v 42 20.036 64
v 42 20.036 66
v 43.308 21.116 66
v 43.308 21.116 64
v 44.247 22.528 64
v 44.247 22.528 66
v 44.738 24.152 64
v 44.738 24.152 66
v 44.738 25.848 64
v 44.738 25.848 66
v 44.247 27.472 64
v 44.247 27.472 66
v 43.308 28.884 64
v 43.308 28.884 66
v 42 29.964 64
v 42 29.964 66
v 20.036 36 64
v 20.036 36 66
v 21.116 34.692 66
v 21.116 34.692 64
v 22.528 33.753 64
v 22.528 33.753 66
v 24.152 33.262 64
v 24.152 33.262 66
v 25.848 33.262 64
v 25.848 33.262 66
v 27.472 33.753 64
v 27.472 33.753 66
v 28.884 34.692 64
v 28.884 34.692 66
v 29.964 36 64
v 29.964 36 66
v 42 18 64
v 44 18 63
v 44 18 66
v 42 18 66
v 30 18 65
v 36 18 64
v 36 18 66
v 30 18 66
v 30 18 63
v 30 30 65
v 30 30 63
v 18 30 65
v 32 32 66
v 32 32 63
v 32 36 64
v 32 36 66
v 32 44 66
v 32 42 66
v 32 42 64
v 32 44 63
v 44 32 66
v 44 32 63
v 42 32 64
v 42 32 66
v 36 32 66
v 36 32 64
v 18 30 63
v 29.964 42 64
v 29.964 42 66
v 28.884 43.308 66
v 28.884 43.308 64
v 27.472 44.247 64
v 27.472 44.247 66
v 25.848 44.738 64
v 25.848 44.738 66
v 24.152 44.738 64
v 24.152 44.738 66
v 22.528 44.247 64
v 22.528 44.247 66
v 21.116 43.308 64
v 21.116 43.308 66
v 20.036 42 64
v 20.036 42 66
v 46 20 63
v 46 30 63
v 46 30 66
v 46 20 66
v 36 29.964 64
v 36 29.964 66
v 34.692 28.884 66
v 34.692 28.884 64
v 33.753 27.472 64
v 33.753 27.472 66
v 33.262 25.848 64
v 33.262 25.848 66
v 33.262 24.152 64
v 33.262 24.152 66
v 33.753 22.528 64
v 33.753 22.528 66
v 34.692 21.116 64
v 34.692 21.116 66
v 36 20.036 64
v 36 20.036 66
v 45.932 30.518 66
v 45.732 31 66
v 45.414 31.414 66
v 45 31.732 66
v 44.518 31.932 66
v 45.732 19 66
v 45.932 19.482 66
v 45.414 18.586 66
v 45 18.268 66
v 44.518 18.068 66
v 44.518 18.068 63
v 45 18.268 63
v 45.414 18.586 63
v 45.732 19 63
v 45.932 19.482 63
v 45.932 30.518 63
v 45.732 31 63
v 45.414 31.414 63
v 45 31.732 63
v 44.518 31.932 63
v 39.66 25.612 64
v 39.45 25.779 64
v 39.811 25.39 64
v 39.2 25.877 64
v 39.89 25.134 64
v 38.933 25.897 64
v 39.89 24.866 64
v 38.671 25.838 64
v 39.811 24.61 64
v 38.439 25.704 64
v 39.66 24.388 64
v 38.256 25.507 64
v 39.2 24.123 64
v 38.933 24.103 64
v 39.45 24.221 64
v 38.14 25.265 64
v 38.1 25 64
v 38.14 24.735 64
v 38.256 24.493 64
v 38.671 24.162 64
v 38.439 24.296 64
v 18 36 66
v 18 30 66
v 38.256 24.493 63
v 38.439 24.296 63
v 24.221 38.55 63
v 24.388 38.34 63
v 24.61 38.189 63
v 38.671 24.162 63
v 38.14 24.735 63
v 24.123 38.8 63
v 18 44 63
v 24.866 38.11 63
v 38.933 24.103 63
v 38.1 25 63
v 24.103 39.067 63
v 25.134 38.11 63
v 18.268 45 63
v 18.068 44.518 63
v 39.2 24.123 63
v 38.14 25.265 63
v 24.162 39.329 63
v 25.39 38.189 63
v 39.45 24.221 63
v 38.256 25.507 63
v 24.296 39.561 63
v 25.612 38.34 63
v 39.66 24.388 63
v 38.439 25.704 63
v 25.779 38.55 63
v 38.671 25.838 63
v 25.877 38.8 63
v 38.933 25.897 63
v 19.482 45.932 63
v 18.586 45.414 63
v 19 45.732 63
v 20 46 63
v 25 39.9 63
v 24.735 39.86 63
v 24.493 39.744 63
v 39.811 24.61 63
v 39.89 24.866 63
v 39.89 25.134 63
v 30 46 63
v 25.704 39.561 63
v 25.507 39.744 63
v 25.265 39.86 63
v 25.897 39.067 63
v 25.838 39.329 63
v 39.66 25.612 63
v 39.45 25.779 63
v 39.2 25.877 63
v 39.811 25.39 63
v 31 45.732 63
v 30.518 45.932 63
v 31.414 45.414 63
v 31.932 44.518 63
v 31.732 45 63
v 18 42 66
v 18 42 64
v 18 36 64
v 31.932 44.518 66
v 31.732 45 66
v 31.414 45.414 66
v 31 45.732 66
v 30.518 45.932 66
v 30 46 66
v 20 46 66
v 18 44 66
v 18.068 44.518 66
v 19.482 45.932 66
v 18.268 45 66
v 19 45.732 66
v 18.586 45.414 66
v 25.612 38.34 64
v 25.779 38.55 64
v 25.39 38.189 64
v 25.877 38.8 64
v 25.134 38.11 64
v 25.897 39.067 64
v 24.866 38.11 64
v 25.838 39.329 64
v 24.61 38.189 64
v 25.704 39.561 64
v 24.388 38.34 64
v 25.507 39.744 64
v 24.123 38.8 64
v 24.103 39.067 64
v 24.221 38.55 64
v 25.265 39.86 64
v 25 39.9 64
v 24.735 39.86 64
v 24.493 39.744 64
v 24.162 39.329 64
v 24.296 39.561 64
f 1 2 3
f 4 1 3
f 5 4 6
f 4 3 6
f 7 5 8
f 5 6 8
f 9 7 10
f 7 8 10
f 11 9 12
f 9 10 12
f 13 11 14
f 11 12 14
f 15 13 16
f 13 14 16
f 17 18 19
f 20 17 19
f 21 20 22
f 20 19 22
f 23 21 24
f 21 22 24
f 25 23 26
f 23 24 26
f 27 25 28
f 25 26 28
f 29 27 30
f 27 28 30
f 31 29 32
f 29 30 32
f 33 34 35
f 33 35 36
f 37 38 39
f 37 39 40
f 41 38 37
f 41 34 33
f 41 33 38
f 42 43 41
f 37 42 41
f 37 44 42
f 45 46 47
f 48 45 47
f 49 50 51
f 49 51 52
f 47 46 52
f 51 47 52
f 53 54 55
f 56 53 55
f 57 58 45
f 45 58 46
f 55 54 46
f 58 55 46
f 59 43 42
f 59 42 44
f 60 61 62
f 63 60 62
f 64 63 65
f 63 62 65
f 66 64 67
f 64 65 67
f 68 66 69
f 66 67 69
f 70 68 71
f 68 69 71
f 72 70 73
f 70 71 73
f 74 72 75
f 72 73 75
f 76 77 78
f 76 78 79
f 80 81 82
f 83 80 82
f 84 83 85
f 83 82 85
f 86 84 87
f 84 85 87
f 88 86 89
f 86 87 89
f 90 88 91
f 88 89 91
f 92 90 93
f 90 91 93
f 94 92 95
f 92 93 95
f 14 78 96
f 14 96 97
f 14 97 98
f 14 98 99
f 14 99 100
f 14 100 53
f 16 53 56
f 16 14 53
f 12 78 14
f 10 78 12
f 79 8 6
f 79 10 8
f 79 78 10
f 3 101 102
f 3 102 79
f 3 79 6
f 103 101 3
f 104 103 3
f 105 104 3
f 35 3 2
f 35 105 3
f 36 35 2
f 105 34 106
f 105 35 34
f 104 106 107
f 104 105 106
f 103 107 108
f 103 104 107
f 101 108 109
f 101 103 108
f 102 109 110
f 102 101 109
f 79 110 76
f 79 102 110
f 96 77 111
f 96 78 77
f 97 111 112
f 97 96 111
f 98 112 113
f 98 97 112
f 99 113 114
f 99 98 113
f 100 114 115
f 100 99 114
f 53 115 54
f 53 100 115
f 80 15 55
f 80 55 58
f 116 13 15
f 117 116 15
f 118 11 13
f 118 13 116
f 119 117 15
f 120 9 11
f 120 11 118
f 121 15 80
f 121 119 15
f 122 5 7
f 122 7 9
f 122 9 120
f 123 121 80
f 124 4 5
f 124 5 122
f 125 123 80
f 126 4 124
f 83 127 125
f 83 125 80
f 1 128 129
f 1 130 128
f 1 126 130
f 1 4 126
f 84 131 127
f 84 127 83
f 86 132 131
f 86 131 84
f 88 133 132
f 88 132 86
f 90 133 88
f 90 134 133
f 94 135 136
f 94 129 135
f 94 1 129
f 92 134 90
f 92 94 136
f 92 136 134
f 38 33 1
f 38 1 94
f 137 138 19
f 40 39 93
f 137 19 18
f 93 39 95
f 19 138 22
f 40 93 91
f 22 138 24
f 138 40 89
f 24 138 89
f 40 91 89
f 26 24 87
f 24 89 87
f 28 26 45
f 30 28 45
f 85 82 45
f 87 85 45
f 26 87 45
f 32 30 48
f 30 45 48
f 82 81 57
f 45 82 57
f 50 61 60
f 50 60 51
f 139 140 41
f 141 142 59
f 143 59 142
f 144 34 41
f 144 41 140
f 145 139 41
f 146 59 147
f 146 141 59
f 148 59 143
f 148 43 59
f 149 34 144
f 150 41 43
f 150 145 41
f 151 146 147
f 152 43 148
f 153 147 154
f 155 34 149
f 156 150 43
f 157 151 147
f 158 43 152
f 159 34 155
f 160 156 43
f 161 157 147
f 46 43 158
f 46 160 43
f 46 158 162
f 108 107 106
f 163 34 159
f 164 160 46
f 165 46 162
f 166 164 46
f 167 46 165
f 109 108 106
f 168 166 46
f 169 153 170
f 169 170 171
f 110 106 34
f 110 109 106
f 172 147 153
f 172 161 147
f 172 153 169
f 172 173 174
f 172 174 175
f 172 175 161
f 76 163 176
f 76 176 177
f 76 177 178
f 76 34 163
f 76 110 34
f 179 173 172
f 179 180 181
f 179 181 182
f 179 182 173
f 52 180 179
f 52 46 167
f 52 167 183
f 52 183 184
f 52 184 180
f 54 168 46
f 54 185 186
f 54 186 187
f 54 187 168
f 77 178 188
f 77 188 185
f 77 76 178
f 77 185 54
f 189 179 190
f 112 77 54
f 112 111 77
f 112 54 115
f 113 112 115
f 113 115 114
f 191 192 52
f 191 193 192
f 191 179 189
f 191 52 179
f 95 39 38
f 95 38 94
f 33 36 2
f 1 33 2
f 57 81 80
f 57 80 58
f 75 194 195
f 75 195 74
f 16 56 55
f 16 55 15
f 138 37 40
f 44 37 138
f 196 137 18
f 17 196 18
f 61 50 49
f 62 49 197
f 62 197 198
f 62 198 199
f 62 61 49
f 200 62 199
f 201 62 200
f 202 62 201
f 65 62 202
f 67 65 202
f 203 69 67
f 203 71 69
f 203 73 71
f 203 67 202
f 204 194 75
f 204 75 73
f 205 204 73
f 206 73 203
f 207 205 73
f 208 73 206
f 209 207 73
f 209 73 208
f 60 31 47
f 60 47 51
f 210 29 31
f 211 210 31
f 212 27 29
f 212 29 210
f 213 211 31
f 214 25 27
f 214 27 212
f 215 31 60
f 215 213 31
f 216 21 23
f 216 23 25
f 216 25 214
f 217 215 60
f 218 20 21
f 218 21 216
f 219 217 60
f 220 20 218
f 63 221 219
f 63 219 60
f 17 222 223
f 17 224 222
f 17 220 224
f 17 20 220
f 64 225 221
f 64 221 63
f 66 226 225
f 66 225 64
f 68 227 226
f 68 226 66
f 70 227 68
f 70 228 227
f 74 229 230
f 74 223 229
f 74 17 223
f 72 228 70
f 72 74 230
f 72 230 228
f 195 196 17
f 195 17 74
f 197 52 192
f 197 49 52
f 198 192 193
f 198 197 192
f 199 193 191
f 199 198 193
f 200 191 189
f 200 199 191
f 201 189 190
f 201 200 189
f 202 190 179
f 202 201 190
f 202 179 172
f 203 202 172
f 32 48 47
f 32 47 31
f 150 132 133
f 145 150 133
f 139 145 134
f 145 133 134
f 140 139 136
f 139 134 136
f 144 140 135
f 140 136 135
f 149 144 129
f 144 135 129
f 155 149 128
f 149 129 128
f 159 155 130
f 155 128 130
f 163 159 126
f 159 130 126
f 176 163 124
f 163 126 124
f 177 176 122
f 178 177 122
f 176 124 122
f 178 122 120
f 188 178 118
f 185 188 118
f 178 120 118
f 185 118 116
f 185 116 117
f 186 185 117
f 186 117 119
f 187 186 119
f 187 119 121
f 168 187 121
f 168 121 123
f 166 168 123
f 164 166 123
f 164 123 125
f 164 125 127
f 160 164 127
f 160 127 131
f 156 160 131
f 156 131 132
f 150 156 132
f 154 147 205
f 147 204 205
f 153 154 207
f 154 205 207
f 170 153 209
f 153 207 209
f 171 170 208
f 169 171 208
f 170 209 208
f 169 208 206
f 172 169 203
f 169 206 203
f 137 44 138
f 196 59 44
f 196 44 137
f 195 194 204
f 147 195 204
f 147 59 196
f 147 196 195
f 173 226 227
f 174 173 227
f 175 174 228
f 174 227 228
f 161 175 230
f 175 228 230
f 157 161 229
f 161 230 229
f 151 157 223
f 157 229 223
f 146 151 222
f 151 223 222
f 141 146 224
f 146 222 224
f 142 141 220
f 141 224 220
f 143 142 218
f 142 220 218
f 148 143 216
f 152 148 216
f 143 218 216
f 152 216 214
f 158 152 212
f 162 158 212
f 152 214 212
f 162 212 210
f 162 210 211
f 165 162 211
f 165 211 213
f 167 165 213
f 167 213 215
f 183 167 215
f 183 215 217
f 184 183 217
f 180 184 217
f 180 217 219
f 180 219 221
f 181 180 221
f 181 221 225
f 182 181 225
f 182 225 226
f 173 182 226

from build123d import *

# Parameters (mm, degrees)
SKETCH006_W                 = 14
SKETCH006_H                 = 14
PAD002_DEPTH                = 3
POCKET004_DEPTH             = 2
SKETCH008_R                 = 0.9
POCKET005_DEPTH             = 1.001
CLONE001007_PLACEMENT_ANGLE = 90
PAD_DEPTH                   = 3
SKETCH010_W                 = 12
SKETCH010_H                 = 12
POCKET_DEPTH                = 2
CLONE001006_PLACEMENT_ANGLE = 180
FILLET001_R                 = 2
CLONE001009_PLACEMENT_ANGLE = -90
CLONE001012_PLACEMENT_ANGLE = 180


with BuildPart() as pushpin_unit001:
    # Sketch006 → Pad002 (new body)
    with BuildSketch(Plane.XY):
        Rectangle(SKETCH006_W, SKETCH006_H)
    extrude(amount=PAD002_DEPTH)

    # Sketch007 → Pocket004 (cut)
    with BuildSketch(Plane.XY.offset(3)):
        with BuildLine():
            Line((-3, 7), (-3, 4.963869))
            ThreePointArc((-3, 4.963869), (-5.8, 0), (-3, -4.963869))
            Line((-3, -7), (-3, -4.963869))
            Line((3, -7), (-3, -7))
            Line((3, -4.963869), (3, -7))
            ThreePointArc((3, -4.963869), (5.8, 0), (3, 4.963869))
            Line((3, 7), (3, 4.963869))
            Line((-3, 7), (3, 7))
        make_face()
    extrude(amount=-POCKET004_DEPTH, mode=Mode.SUBTRACT)

    # Sketch008 → Pocket005 (cut, through all)
    with BuildSketch(Plane.XY.offset(1)):
        Circle(SKETCH008_R)
    extrude(amount=-POCKET005_DEPTH, mode=Mode.SUBTRACT)


with BuildPart() as pushpin_unit001_1:
    # Clone001005 placement: moved
    add(pushpin_unit001.part.moved(Location((14, 0, 0))))


with BuildPart() as pushpin_unit003:
    # Clone001007 base: copy of pushpin-unit001
    add(pushpin_unit001_1.part)


with BuildPart() as pushpin_unit003_1:
    # Clone001007 placement: moved
    add(pushpin_unit003.part.moved(Location((0, -28, 0))).rotate(Axis((0, -28, 0), (0, 0, 1)), CLONE001007_PLACEMENT_ANGLE))


with BuildPart() as pushpin_unit002:
    # Sketch → Pad (new body)
    with BuildSketch(Plane.XY):
        Polygon((-7, -7), (-7, 7), (7, 7), (7, 5), (-5, -7), align=None)
    extrude(amount=PAD_DEPTH)

    # Sketch010 → Pocket (cut)
    with BuildSketch(Plane(origin=(0, 0, 0), x_dir=(1, 0, 0), z_dir=(0, 0, -1))):
        with Locations((1, 1)):
            Rectangle(SKETCH010_W, SKETCH010_H)
    extrude(amount=-POCKET_DEPTH, mode=Mode.SUBTRACT)


with BuildPart() as pushpin_unit002_1:
    # Clone001006 placement: moved
    add(pushpin_unit002.part.rotate(Axis((0, 0, 0), (0, 0, 1)), CLONE001006_PLACEMENT_ANGLE))


with BuildPart() as clone_of_corner_holder_double002:
    # Fusion001 base: copy of pushpin-unit001
    add(pushpin_unit001_1.part)

    # Fusion001: union pushpin-unit003, pushpin-unit002
    add(pushpin_unit003_1.part)
    add(pushpin_unit002_1.part)

    # Fillet001
    fillet001_edges = [clone_of_corner_holder_double002.edges().sort_by_distance(p)[0] for p in [
        (21, 7, 1.5),
        (21, -7, 1.5),
        (7, -21, 1.5),
        (-7, -21, 1.5),
    ]]
    fillet(fillet001_edges, radius=FILLET001_R)


with BuildPart() as clone_of_corner_holder_double002_1:
    # Clone001008 placement: moved
    add(clone_of_corner_holder_double002.part.moved(Location((-13.497608, 48.033168, 0))))


with BuildPart() as clone_of_corner_holder_double002_2:
    # Clone001009 placement: moved
    add(clone_of_corner_holder_double002_1.part.moved(Location((-30.900794, -30.494573, 0))).rotate(Axis((-30.900794, -30.494573, 0), (0, 0, 1)), CLONE001009_PLACEMENT_ANGLE))


with BuildPart() as clone_of_corner_holder_double002_3:
    # Clone001012 placement: moved
    add(clone_of_corner_holder_double002_2.part.moved(Location((84.263711, 16.007107, 0))).rotate(Axis((84.263711, 16.007107, 0), (0, 0, 1)), CLONE001012_PLACEMENT_ANGLE))


with BuildPart() as clone_of_corner_holder_double002_4:
    # Clone001018 placement: moved
    add(clone_of_corner_holder_double002_3.part.moved(Location((-42.131337, -8.004072, 63))))


solid = clone_of_corner_holder_double002_4.part
